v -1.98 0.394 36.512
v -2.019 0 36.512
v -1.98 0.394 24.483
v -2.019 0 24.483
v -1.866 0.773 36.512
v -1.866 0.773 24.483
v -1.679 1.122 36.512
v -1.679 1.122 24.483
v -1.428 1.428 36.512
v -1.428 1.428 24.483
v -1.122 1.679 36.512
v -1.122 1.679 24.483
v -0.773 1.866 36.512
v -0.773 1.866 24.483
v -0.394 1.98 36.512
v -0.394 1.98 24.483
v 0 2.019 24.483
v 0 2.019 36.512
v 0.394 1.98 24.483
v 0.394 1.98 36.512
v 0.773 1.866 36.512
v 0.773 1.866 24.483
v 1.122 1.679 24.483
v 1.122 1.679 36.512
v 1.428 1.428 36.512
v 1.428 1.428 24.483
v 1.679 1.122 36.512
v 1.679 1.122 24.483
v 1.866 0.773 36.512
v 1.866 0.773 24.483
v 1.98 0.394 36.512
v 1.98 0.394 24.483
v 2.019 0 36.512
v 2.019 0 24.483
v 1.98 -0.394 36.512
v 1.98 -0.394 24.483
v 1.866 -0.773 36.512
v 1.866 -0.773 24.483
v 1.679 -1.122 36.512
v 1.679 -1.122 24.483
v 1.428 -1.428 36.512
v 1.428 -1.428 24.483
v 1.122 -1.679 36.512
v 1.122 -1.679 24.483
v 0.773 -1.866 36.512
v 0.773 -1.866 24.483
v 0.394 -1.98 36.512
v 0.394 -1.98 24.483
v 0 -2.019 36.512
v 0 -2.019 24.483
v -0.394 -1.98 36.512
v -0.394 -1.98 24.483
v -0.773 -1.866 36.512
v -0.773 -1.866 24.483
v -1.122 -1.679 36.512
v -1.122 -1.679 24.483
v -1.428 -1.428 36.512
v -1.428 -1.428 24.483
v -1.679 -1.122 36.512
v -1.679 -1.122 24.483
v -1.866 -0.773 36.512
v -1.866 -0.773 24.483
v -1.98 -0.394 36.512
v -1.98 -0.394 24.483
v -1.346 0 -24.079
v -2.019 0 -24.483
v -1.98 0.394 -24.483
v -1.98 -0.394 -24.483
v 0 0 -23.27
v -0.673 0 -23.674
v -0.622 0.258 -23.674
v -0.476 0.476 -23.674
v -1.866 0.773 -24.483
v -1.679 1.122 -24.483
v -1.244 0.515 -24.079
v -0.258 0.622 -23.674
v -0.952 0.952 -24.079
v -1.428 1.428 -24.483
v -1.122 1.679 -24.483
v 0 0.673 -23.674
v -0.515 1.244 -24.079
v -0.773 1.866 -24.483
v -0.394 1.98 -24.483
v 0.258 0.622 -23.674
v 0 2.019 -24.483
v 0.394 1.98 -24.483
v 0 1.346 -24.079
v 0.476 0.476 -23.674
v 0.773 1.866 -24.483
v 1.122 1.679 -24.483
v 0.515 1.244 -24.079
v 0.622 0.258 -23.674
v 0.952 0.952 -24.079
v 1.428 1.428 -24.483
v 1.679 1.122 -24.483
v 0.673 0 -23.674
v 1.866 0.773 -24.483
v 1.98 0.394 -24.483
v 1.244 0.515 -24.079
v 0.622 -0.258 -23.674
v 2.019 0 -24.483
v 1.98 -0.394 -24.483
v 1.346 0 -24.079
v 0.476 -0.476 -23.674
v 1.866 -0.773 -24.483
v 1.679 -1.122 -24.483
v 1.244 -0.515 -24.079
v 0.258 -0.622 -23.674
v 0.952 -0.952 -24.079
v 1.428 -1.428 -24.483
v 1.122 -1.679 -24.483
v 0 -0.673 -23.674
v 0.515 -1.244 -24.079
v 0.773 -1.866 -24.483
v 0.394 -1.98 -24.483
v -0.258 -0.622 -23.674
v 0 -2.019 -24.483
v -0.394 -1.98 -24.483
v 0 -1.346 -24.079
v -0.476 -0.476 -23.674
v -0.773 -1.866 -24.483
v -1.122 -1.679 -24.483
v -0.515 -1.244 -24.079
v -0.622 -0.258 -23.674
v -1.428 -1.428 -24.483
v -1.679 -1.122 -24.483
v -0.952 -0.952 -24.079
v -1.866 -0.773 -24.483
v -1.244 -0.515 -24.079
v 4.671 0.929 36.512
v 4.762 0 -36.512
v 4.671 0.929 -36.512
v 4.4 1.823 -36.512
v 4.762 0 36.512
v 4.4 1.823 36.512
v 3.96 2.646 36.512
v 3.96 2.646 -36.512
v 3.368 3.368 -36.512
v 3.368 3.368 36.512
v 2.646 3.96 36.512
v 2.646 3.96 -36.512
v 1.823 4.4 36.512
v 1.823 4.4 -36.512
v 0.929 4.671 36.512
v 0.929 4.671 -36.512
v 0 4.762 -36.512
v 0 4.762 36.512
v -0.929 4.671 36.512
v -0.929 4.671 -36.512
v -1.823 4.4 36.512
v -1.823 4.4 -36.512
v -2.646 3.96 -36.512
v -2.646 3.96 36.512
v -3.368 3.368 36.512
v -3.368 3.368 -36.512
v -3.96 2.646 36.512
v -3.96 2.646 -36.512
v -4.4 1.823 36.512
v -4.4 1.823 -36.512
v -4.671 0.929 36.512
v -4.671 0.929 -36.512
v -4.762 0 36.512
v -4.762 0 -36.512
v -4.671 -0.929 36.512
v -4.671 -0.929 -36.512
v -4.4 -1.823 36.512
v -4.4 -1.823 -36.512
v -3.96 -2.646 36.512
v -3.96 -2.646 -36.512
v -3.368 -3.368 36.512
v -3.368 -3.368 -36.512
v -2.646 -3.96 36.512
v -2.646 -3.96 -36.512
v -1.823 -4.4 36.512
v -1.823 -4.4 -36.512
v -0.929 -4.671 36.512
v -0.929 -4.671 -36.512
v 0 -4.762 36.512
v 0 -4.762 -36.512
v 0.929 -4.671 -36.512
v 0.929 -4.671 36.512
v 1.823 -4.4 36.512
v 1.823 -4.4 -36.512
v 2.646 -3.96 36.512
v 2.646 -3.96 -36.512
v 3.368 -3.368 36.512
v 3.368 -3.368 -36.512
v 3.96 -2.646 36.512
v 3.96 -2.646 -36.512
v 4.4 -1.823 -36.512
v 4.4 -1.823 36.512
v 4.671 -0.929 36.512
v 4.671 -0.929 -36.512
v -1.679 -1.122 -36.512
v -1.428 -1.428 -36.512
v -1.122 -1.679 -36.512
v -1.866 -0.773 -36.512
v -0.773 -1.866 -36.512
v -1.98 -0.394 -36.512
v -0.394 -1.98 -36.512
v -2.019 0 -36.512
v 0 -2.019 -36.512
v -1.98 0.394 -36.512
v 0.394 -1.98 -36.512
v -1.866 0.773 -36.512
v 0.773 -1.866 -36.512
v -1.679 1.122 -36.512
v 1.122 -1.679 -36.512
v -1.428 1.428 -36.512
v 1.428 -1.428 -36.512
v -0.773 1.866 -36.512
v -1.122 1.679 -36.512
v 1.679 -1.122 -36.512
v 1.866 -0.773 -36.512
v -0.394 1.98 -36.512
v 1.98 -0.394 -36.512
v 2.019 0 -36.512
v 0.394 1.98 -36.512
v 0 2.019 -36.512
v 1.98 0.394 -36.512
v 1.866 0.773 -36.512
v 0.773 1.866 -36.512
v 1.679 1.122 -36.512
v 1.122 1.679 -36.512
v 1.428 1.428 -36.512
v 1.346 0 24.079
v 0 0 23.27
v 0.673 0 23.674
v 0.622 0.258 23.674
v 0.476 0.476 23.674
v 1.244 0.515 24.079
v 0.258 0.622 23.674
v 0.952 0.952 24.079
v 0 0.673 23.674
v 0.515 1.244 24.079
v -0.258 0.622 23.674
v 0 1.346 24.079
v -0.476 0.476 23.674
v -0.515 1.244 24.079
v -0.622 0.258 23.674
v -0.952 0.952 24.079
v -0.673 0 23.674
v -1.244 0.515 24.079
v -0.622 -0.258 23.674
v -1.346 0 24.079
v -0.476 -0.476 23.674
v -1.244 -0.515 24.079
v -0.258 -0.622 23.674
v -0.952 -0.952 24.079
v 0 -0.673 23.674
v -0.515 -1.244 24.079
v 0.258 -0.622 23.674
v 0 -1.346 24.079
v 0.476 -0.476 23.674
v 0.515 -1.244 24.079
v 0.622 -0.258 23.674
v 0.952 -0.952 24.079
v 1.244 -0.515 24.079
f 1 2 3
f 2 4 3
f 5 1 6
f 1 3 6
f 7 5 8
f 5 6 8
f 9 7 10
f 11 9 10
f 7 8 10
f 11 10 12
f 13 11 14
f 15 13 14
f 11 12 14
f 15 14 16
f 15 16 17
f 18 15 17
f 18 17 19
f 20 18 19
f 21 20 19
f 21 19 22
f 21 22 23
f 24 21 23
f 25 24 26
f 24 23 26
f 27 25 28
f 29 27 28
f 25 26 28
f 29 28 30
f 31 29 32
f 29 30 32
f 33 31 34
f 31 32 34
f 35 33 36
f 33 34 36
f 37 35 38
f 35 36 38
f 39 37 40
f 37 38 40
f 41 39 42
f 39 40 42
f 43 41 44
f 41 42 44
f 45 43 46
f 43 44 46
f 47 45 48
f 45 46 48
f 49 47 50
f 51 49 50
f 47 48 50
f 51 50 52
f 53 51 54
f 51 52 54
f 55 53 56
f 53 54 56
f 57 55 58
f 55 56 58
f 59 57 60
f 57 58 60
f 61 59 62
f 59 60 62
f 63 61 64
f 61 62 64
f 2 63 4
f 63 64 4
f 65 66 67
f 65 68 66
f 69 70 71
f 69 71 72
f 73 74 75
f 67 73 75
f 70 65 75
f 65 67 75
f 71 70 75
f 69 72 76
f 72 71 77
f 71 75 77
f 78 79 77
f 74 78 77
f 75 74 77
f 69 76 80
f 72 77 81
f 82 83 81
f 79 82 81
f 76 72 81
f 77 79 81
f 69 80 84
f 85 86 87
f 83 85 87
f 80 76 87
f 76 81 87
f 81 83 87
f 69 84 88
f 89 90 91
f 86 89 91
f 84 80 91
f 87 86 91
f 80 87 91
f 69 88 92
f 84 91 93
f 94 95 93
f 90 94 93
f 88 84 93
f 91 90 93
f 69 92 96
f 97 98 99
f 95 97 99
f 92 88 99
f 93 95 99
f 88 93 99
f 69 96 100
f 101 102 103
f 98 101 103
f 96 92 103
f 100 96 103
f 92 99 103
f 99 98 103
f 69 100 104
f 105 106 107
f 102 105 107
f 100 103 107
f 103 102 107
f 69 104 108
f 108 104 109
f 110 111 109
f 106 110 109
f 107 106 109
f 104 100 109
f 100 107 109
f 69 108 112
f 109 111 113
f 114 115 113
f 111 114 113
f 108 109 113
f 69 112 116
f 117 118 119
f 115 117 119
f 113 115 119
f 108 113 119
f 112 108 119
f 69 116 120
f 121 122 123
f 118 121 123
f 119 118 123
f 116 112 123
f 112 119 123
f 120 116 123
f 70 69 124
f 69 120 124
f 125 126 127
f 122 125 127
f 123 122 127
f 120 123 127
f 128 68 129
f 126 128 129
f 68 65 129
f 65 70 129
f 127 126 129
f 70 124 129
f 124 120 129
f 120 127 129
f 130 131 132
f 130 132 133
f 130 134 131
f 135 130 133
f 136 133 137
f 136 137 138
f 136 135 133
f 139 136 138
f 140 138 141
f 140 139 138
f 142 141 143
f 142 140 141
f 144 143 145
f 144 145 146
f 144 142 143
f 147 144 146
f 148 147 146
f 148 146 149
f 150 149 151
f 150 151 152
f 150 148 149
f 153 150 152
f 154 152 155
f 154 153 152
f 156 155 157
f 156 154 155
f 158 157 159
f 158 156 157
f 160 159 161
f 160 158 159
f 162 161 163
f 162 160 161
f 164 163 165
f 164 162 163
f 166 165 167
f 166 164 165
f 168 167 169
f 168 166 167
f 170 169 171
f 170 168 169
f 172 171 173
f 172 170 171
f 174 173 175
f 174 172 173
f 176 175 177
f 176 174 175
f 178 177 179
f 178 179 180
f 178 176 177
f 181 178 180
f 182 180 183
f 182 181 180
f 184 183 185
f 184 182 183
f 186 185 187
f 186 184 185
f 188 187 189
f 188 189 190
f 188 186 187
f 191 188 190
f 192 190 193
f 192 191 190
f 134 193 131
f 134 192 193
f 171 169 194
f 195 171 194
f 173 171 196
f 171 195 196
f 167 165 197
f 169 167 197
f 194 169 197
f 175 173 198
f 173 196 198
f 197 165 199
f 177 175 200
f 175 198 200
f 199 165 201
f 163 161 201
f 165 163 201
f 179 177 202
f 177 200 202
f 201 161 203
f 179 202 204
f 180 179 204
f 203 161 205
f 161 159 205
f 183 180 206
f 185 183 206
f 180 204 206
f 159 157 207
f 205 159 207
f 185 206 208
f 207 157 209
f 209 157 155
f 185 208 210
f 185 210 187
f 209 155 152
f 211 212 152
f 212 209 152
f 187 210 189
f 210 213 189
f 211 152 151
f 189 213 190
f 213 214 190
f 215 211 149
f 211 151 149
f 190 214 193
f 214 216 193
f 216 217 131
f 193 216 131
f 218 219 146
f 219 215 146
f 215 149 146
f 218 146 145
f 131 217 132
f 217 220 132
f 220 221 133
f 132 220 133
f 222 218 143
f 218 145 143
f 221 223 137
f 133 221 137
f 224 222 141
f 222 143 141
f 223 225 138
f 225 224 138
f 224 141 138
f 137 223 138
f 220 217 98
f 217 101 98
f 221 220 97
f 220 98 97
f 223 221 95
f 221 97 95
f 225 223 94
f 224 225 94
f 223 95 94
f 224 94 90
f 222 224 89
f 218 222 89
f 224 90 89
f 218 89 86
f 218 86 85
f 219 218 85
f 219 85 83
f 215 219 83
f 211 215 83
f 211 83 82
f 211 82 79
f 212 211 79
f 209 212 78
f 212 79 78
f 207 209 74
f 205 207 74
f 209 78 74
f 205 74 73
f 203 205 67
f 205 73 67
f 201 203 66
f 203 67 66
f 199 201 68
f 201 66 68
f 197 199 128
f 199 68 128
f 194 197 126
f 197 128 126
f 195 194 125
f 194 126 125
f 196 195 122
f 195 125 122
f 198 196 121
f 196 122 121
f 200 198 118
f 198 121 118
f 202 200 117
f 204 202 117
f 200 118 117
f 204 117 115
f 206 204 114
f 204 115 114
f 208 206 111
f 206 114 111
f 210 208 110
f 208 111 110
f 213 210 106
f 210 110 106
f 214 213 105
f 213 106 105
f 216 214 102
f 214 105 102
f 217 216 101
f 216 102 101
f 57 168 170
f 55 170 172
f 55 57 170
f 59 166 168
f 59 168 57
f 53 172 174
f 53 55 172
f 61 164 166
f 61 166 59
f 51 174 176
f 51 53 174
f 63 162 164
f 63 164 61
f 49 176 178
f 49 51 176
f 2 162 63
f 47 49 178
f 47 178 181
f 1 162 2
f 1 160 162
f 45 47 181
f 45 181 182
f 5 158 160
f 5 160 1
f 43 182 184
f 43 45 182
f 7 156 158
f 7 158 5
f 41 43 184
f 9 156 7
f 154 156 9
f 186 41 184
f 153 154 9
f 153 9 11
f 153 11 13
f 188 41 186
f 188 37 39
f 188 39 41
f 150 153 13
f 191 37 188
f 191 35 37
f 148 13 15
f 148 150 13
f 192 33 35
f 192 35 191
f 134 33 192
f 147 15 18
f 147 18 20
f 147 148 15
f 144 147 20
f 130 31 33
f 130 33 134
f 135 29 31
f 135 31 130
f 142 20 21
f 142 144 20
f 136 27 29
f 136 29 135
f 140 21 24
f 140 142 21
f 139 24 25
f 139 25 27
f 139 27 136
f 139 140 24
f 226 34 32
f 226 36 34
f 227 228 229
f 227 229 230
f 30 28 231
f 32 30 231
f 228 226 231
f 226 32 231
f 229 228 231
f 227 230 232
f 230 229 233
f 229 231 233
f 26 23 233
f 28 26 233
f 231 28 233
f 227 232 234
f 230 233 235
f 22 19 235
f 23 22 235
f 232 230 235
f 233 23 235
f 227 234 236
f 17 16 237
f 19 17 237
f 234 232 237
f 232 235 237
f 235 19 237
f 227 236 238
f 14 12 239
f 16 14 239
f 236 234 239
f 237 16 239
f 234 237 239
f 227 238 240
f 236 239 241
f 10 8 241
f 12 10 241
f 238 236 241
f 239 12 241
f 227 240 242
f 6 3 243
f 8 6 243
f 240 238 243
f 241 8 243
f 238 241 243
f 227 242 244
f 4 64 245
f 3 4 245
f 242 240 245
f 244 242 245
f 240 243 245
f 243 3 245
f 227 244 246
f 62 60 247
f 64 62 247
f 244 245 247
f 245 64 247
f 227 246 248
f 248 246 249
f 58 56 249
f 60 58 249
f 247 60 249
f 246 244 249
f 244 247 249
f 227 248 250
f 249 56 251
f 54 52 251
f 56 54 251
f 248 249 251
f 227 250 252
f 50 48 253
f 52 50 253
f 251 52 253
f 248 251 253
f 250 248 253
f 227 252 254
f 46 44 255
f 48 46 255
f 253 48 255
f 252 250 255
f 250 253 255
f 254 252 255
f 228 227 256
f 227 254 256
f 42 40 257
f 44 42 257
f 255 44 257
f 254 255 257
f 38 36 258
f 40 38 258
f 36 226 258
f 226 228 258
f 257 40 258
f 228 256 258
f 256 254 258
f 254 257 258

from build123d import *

# Parameters (mm, degrees)
SKETCH1_R                            = 4.7625
BOSS_EXTRUDE1_DEPTH                  = 36.5125
F_10_32_TAPPED_HOLE2_D               = 4.0386
F_10_32_TAPPED_HOLE2_DEPTH           = 12.02944
F_10_32_TAPPED_HOLE2_TIP             = 1.213317848
F_10_32_TAPPED_HOLE2_ON_FACE_2_D     = 4.0386
F_10_32_TAPPED_HOLE2_ON_FACE_2_DEPTH = 12.02944
F_10_32_TAPPED_HOLE2_ON_FACE_2_TIP   = 1.213317848


with BuildPart() as part:
    # Sketch1 → Boss-Extrude1 (new, symmetric)
    with BuildSketch(Plane.XY):
        Circle(SKETCH1_R)
    extrude(amount=BOSS_EXTRUDE1_DEPTH, both=True)

    # #10-32 Tapped Hole2
    with Locations(Plane(origin=(0, 0, -36.5125), x_dir=(-1, 0, 0), z_dir=(0, 0, -1))):
        with Locations((0, 0)):
            Hole(F_10_32_TAPPED_HOLE2_D / 2, depth=F_10_32_TAPPED_HOLE2_DEPTH)
            with Locations((0, 0, -(F_10_32_TAPPED_HOLE2_DEPTH + F_10_32_TAPPED_HOLE2_TIP / 2))):  # 118° drill point
                Cone(0, F_10_32_TAPPED_HOLE2_D / 2, F_10_32_TAPPED_HOLE2_TIP, mode=Mode.SUBTRACT)

    # #10-32 Tapped Hole2 on face 2
    with Locations(Plane.XY.offset(36.5125)):
        with Locations((0, 0)):
            Hole(F_10_32_TAPPED_HOLE2_ON_FACE_2_D / 2, depth=F_10_32_TAPPED_HOLE2_ON_FACE_2_DEPTH)
            with Locations((0, 0, -(F_10_32_TAPPED_HOLE2_ON_FACE_2_DEPTH + F_10_32_TAPPED_HOLE2_ON_FACE_2_TIP / 2))):  # 118° drill point
                Cone(0, F_10_32_TAPPED_HOLE2_ON_FACE_2_D / 2, F_10_32_TAPPED_HOLE2_ON_FACE_2_TIP, mode=Mode.SUBTRACT)


solid = part.part
